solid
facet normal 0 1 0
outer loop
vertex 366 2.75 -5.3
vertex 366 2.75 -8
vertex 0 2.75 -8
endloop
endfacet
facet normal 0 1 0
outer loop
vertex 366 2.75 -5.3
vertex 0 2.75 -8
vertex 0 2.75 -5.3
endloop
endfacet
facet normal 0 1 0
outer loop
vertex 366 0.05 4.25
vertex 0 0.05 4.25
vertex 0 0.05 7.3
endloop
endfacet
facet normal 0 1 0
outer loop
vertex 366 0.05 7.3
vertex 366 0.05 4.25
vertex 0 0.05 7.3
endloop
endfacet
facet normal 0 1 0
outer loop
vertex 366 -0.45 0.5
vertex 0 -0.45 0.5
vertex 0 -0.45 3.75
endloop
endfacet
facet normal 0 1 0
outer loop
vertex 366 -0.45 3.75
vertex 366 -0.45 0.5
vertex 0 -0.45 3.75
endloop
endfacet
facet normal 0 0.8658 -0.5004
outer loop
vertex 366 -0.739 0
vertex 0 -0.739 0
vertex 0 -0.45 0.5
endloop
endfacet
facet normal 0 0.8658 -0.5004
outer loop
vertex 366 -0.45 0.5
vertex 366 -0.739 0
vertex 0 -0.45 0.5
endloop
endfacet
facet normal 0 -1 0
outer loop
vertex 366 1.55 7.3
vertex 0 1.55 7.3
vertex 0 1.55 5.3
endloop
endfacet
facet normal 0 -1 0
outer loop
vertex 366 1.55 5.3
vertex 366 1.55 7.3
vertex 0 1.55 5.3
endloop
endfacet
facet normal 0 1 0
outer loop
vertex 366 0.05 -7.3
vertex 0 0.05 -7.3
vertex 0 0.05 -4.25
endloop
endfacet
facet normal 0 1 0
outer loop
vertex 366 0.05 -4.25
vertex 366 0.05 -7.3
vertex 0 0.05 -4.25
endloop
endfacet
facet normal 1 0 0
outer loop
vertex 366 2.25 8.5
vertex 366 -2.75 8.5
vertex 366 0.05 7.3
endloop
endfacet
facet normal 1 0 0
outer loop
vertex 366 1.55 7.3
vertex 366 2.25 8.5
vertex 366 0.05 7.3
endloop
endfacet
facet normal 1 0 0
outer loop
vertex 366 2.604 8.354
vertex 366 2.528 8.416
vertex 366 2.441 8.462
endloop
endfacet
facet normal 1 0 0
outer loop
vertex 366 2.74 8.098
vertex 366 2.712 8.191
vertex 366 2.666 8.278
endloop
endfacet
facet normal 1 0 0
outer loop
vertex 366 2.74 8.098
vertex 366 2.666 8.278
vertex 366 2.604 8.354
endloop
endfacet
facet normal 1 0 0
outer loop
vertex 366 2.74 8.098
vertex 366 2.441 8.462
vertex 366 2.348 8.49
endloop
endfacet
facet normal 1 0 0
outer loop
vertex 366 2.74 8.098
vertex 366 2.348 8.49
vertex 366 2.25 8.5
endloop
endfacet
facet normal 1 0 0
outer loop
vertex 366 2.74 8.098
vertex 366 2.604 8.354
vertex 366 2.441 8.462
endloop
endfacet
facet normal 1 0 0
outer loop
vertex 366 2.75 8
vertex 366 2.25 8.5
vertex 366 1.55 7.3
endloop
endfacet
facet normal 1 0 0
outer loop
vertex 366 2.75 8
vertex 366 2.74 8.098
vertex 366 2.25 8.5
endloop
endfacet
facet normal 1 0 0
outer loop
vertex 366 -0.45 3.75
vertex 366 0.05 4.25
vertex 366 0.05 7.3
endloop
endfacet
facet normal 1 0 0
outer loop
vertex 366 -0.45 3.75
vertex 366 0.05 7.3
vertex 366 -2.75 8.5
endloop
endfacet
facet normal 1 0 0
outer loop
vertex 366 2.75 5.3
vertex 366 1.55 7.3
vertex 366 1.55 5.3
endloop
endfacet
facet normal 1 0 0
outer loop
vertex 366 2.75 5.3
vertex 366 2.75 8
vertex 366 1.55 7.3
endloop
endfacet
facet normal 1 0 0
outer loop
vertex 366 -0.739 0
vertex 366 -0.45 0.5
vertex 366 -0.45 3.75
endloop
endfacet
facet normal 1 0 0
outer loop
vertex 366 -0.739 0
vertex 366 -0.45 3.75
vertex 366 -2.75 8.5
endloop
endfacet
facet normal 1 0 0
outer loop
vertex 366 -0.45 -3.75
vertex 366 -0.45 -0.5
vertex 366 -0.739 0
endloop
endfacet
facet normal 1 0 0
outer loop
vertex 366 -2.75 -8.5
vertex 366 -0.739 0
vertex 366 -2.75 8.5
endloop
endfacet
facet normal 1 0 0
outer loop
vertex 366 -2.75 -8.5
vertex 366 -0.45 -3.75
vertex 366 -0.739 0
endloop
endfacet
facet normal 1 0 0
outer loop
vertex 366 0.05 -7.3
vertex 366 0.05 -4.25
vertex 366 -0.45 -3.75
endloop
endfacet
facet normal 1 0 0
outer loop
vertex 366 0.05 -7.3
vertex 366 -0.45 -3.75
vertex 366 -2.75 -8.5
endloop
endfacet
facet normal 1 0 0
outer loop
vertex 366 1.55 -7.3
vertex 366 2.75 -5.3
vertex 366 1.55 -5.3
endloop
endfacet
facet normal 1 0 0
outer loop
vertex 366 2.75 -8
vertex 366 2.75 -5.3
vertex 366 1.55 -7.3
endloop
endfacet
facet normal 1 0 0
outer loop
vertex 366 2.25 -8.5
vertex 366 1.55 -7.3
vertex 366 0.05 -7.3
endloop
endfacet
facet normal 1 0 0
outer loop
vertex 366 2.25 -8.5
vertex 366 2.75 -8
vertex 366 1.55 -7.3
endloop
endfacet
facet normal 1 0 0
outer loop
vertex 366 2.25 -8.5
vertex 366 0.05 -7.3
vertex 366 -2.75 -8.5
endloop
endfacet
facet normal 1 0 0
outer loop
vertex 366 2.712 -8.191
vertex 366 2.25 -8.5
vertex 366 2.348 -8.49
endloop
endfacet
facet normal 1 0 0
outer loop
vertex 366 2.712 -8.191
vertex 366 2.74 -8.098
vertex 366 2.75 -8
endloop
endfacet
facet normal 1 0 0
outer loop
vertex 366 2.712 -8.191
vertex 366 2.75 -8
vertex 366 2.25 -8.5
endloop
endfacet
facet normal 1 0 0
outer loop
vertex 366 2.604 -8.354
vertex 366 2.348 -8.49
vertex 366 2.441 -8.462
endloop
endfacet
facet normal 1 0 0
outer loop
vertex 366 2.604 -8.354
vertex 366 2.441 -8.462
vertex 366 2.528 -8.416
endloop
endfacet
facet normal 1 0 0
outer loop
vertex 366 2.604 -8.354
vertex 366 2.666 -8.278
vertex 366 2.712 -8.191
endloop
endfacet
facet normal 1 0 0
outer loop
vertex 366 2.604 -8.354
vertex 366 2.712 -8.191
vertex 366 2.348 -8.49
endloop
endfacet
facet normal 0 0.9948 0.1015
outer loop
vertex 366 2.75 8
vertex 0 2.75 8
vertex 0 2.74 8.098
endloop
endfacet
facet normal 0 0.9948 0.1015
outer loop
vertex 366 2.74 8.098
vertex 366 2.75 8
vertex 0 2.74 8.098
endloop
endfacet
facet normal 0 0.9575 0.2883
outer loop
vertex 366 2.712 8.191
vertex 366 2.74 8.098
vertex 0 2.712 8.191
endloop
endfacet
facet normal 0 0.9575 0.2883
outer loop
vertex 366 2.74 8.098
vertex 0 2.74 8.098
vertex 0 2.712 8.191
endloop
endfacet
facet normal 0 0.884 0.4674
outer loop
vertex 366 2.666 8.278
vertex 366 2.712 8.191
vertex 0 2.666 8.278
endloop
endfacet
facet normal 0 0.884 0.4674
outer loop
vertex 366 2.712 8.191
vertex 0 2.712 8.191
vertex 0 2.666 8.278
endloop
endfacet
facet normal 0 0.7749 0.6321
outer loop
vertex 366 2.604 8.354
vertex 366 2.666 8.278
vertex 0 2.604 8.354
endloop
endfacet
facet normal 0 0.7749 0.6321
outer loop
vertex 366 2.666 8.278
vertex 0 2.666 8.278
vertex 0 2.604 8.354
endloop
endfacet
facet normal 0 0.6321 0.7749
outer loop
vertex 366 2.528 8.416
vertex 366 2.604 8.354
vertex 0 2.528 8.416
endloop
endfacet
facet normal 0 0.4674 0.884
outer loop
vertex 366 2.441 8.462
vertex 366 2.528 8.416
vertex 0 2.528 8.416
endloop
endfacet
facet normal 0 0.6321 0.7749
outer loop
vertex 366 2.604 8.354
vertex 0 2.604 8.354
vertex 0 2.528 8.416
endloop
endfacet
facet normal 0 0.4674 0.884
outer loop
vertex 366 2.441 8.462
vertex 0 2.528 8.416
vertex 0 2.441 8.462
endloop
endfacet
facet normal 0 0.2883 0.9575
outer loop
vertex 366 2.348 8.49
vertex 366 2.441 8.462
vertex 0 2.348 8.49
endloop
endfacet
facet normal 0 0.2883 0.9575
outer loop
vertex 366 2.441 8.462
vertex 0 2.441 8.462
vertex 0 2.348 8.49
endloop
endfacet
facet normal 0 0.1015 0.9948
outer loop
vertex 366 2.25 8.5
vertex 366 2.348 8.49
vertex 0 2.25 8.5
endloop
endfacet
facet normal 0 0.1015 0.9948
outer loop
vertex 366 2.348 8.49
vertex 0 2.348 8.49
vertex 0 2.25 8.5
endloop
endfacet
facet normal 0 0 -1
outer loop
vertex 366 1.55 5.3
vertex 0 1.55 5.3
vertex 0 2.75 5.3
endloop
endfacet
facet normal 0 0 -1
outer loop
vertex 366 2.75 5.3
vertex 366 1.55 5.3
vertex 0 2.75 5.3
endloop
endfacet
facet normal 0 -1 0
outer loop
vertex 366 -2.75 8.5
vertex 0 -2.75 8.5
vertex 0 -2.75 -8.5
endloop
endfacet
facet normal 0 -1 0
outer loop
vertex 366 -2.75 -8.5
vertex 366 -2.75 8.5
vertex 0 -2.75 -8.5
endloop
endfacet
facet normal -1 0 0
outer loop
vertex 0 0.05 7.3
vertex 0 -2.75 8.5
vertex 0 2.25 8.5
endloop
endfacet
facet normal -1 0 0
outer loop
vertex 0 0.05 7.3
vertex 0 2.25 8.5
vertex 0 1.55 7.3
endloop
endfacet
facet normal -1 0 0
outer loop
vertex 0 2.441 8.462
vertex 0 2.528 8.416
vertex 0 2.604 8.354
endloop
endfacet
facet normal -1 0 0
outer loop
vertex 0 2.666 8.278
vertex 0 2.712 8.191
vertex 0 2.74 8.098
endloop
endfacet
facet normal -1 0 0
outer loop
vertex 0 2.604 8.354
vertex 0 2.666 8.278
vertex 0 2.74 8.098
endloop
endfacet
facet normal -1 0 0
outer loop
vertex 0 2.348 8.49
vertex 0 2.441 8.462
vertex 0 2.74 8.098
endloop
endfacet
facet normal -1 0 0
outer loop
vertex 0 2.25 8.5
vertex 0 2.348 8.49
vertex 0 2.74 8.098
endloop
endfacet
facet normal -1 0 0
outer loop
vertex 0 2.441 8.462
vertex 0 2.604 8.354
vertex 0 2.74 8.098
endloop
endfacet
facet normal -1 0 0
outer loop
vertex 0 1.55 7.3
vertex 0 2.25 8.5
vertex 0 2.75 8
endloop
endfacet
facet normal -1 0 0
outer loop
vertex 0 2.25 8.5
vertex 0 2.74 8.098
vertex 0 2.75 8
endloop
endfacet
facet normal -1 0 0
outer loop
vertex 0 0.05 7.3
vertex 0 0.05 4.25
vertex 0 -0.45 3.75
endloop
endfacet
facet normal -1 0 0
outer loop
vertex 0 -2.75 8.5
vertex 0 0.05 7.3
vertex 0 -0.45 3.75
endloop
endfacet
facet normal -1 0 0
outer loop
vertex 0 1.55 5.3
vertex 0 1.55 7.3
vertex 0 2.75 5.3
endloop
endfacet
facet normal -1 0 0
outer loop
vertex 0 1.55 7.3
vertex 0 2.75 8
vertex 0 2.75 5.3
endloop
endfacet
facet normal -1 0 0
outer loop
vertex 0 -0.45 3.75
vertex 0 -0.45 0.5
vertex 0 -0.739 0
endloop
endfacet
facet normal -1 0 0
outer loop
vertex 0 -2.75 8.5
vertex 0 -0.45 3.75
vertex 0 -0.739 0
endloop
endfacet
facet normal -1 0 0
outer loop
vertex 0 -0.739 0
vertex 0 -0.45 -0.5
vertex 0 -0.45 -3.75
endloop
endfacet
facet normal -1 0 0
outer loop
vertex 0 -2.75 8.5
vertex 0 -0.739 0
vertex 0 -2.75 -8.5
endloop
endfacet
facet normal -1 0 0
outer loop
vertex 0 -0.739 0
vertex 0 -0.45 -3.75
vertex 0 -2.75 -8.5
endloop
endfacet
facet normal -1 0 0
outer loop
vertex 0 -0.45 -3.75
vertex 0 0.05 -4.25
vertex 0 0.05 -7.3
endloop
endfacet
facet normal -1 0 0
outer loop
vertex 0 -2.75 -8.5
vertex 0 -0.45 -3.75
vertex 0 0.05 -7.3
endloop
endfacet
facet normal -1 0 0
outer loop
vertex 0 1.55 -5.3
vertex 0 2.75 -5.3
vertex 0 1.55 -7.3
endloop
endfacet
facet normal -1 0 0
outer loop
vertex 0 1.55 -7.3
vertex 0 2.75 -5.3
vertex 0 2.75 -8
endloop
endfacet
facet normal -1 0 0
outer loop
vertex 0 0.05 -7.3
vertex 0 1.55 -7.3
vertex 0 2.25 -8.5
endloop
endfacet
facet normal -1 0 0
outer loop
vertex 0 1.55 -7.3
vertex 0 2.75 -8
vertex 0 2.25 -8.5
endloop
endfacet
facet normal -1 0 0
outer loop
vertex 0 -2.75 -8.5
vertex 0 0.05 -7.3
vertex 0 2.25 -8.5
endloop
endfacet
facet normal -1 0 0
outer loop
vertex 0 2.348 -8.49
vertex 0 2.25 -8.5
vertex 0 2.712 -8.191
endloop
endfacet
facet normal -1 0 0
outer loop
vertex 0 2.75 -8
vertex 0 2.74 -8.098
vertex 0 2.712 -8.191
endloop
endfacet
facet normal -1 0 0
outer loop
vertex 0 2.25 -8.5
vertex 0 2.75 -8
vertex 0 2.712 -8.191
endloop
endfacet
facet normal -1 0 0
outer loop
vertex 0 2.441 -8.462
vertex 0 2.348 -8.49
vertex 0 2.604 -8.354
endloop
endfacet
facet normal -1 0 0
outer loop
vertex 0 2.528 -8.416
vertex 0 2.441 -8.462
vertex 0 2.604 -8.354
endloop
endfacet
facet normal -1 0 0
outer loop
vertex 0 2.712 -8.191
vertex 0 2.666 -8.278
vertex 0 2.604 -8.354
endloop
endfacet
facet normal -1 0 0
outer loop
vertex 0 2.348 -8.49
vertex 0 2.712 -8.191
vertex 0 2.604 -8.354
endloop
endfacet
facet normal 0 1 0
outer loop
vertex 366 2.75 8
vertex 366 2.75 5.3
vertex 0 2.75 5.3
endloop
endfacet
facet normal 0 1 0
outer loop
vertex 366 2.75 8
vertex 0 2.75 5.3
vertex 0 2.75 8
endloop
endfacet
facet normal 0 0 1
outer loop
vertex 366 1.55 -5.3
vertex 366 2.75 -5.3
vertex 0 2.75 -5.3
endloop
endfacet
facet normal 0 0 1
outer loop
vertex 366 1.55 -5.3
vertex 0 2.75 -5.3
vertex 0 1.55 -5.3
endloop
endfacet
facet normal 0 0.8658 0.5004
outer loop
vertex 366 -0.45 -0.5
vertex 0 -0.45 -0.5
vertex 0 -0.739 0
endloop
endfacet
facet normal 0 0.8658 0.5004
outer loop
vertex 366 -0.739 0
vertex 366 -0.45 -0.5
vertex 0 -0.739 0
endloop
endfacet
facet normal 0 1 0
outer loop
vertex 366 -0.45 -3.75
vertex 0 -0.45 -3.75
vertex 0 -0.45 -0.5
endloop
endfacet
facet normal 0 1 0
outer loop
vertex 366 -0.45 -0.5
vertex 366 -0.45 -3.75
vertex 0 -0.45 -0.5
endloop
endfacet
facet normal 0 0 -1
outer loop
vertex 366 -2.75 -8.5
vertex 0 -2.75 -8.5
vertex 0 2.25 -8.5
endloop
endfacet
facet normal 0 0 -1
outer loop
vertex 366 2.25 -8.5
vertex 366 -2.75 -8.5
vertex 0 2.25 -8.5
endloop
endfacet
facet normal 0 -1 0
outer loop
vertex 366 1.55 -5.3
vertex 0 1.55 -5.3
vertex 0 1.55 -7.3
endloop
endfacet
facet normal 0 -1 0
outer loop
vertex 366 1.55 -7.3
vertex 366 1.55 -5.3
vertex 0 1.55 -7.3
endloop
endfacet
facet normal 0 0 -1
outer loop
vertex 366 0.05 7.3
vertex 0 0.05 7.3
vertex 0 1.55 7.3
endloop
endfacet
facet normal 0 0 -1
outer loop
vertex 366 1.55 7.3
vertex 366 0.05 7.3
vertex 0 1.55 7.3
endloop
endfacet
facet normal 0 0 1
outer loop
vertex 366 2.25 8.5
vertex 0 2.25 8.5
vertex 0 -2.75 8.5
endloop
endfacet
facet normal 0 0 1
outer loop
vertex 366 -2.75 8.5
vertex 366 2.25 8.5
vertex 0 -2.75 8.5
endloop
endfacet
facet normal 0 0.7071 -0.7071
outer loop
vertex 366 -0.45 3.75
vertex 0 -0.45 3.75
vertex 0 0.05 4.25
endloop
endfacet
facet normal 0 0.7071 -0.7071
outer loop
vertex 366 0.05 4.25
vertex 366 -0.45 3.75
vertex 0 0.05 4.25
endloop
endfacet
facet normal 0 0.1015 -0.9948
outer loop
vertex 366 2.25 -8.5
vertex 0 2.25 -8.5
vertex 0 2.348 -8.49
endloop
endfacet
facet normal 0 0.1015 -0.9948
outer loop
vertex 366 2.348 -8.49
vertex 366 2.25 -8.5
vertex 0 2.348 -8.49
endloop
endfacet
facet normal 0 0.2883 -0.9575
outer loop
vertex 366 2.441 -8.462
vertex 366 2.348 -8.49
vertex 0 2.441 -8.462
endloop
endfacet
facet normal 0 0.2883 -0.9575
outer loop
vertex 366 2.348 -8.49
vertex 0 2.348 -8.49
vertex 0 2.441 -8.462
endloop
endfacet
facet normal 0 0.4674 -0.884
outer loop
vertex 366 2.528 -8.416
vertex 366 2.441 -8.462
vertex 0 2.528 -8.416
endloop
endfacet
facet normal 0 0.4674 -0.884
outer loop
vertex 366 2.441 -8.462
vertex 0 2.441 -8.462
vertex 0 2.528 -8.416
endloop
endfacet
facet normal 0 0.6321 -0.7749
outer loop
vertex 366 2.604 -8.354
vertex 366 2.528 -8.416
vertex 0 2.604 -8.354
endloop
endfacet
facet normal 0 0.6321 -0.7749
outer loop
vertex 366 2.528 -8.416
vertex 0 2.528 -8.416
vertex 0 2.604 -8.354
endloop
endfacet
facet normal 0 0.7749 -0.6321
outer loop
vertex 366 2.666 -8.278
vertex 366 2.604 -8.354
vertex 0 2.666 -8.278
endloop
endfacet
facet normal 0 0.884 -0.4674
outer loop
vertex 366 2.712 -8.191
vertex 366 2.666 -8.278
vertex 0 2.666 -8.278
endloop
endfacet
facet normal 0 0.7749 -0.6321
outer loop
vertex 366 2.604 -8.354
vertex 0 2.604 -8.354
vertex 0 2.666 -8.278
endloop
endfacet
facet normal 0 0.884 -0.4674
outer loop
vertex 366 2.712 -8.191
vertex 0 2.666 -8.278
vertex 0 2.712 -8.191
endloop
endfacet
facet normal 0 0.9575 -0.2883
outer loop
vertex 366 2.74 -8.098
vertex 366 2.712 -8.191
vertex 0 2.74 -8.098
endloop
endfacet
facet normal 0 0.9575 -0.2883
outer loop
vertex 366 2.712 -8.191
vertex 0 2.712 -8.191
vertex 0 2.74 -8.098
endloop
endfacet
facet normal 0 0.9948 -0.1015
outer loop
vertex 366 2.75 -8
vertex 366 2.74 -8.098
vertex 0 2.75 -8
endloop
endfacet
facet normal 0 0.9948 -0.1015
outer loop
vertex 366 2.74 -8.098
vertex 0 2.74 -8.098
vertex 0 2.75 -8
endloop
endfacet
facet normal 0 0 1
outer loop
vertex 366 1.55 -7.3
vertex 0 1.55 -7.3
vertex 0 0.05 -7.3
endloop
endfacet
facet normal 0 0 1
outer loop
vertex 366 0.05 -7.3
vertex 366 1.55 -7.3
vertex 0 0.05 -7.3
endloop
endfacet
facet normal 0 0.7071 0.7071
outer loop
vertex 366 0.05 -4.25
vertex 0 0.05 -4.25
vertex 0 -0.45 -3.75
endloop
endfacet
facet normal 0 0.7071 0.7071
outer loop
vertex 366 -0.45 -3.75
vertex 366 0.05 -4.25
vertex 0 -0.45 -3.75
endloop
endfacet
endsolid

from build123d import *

# Parameters (mm, degrees)
BOSS_EXTRUDE1_DEPTH = 366


with BuildPart() as part:
    # Sketch5 → Boss-Extrude1 (new body)
    with BuildSketch(Plane(origin=(0, 0, 0), x_dir=(0, 0, -1), z_dir=(1, 0, 0))):
        with BuildLine():
            Line((-8.499999996, -2.75), (8.499999996, -2.75))
            Line((8.499999996, -2.75), (8.499999996, 2.25))
            ThreePointArc((8.499999996, 2.25), (8.353553387, 2.603553391), (7.999999996, 2.75))
            Line((7.999999996, 2.75), (5.299999996, 2.75))
            Line((5.299999996, 2.75), (5.299999996, 1.55))
            Line((5.299999996, 1.55), (7.299999998, 1.55))
            Line((7.299999998, 1.55), (7.299999998, 0.05))
            Line((7.299999998, 0.05), (4.249999998, 0.05))
            Line((4.249999998, 0.05), (3.749999998, -0.45))
            Line((3.749999998, -0.45), (0.499999998, -0.45))
            Line((0.499999998, -0.45), (0, -0.738675133))
            Line((0, -0.738675133), (-0.499999998, -0.45))
            Line((-0.499999998, -0.45), (-3.749999998, -0.45))
            Line((-3.749999998, -0.45), (-4.249999998, 0.05))
            Line((-4.249999998, 0.05), (-7.299999998, 0.05))
            Line((-7.299999998, 0.05), (-7.299999998, 1.55))
            Line((-7.299999998, 1.55), (-5.299999996, 1.55))
            Line((-5.299999996, 1.55), (-5.299999996, 2.75))
            Line((-5.299999996, 2.75), (-7.999999996, 2.75))
            ThreePointArc((-7.999999996, 2.75), (-8.353553387, 2.603553391), (-8.499999996, 2.25))
            Line((-8.499999996, 2.25), (-8.499999996, -2.75))
        make_face()
    extrude(amount=BOSS_EXTRUDE1_DEPTH)


solid = part.part
